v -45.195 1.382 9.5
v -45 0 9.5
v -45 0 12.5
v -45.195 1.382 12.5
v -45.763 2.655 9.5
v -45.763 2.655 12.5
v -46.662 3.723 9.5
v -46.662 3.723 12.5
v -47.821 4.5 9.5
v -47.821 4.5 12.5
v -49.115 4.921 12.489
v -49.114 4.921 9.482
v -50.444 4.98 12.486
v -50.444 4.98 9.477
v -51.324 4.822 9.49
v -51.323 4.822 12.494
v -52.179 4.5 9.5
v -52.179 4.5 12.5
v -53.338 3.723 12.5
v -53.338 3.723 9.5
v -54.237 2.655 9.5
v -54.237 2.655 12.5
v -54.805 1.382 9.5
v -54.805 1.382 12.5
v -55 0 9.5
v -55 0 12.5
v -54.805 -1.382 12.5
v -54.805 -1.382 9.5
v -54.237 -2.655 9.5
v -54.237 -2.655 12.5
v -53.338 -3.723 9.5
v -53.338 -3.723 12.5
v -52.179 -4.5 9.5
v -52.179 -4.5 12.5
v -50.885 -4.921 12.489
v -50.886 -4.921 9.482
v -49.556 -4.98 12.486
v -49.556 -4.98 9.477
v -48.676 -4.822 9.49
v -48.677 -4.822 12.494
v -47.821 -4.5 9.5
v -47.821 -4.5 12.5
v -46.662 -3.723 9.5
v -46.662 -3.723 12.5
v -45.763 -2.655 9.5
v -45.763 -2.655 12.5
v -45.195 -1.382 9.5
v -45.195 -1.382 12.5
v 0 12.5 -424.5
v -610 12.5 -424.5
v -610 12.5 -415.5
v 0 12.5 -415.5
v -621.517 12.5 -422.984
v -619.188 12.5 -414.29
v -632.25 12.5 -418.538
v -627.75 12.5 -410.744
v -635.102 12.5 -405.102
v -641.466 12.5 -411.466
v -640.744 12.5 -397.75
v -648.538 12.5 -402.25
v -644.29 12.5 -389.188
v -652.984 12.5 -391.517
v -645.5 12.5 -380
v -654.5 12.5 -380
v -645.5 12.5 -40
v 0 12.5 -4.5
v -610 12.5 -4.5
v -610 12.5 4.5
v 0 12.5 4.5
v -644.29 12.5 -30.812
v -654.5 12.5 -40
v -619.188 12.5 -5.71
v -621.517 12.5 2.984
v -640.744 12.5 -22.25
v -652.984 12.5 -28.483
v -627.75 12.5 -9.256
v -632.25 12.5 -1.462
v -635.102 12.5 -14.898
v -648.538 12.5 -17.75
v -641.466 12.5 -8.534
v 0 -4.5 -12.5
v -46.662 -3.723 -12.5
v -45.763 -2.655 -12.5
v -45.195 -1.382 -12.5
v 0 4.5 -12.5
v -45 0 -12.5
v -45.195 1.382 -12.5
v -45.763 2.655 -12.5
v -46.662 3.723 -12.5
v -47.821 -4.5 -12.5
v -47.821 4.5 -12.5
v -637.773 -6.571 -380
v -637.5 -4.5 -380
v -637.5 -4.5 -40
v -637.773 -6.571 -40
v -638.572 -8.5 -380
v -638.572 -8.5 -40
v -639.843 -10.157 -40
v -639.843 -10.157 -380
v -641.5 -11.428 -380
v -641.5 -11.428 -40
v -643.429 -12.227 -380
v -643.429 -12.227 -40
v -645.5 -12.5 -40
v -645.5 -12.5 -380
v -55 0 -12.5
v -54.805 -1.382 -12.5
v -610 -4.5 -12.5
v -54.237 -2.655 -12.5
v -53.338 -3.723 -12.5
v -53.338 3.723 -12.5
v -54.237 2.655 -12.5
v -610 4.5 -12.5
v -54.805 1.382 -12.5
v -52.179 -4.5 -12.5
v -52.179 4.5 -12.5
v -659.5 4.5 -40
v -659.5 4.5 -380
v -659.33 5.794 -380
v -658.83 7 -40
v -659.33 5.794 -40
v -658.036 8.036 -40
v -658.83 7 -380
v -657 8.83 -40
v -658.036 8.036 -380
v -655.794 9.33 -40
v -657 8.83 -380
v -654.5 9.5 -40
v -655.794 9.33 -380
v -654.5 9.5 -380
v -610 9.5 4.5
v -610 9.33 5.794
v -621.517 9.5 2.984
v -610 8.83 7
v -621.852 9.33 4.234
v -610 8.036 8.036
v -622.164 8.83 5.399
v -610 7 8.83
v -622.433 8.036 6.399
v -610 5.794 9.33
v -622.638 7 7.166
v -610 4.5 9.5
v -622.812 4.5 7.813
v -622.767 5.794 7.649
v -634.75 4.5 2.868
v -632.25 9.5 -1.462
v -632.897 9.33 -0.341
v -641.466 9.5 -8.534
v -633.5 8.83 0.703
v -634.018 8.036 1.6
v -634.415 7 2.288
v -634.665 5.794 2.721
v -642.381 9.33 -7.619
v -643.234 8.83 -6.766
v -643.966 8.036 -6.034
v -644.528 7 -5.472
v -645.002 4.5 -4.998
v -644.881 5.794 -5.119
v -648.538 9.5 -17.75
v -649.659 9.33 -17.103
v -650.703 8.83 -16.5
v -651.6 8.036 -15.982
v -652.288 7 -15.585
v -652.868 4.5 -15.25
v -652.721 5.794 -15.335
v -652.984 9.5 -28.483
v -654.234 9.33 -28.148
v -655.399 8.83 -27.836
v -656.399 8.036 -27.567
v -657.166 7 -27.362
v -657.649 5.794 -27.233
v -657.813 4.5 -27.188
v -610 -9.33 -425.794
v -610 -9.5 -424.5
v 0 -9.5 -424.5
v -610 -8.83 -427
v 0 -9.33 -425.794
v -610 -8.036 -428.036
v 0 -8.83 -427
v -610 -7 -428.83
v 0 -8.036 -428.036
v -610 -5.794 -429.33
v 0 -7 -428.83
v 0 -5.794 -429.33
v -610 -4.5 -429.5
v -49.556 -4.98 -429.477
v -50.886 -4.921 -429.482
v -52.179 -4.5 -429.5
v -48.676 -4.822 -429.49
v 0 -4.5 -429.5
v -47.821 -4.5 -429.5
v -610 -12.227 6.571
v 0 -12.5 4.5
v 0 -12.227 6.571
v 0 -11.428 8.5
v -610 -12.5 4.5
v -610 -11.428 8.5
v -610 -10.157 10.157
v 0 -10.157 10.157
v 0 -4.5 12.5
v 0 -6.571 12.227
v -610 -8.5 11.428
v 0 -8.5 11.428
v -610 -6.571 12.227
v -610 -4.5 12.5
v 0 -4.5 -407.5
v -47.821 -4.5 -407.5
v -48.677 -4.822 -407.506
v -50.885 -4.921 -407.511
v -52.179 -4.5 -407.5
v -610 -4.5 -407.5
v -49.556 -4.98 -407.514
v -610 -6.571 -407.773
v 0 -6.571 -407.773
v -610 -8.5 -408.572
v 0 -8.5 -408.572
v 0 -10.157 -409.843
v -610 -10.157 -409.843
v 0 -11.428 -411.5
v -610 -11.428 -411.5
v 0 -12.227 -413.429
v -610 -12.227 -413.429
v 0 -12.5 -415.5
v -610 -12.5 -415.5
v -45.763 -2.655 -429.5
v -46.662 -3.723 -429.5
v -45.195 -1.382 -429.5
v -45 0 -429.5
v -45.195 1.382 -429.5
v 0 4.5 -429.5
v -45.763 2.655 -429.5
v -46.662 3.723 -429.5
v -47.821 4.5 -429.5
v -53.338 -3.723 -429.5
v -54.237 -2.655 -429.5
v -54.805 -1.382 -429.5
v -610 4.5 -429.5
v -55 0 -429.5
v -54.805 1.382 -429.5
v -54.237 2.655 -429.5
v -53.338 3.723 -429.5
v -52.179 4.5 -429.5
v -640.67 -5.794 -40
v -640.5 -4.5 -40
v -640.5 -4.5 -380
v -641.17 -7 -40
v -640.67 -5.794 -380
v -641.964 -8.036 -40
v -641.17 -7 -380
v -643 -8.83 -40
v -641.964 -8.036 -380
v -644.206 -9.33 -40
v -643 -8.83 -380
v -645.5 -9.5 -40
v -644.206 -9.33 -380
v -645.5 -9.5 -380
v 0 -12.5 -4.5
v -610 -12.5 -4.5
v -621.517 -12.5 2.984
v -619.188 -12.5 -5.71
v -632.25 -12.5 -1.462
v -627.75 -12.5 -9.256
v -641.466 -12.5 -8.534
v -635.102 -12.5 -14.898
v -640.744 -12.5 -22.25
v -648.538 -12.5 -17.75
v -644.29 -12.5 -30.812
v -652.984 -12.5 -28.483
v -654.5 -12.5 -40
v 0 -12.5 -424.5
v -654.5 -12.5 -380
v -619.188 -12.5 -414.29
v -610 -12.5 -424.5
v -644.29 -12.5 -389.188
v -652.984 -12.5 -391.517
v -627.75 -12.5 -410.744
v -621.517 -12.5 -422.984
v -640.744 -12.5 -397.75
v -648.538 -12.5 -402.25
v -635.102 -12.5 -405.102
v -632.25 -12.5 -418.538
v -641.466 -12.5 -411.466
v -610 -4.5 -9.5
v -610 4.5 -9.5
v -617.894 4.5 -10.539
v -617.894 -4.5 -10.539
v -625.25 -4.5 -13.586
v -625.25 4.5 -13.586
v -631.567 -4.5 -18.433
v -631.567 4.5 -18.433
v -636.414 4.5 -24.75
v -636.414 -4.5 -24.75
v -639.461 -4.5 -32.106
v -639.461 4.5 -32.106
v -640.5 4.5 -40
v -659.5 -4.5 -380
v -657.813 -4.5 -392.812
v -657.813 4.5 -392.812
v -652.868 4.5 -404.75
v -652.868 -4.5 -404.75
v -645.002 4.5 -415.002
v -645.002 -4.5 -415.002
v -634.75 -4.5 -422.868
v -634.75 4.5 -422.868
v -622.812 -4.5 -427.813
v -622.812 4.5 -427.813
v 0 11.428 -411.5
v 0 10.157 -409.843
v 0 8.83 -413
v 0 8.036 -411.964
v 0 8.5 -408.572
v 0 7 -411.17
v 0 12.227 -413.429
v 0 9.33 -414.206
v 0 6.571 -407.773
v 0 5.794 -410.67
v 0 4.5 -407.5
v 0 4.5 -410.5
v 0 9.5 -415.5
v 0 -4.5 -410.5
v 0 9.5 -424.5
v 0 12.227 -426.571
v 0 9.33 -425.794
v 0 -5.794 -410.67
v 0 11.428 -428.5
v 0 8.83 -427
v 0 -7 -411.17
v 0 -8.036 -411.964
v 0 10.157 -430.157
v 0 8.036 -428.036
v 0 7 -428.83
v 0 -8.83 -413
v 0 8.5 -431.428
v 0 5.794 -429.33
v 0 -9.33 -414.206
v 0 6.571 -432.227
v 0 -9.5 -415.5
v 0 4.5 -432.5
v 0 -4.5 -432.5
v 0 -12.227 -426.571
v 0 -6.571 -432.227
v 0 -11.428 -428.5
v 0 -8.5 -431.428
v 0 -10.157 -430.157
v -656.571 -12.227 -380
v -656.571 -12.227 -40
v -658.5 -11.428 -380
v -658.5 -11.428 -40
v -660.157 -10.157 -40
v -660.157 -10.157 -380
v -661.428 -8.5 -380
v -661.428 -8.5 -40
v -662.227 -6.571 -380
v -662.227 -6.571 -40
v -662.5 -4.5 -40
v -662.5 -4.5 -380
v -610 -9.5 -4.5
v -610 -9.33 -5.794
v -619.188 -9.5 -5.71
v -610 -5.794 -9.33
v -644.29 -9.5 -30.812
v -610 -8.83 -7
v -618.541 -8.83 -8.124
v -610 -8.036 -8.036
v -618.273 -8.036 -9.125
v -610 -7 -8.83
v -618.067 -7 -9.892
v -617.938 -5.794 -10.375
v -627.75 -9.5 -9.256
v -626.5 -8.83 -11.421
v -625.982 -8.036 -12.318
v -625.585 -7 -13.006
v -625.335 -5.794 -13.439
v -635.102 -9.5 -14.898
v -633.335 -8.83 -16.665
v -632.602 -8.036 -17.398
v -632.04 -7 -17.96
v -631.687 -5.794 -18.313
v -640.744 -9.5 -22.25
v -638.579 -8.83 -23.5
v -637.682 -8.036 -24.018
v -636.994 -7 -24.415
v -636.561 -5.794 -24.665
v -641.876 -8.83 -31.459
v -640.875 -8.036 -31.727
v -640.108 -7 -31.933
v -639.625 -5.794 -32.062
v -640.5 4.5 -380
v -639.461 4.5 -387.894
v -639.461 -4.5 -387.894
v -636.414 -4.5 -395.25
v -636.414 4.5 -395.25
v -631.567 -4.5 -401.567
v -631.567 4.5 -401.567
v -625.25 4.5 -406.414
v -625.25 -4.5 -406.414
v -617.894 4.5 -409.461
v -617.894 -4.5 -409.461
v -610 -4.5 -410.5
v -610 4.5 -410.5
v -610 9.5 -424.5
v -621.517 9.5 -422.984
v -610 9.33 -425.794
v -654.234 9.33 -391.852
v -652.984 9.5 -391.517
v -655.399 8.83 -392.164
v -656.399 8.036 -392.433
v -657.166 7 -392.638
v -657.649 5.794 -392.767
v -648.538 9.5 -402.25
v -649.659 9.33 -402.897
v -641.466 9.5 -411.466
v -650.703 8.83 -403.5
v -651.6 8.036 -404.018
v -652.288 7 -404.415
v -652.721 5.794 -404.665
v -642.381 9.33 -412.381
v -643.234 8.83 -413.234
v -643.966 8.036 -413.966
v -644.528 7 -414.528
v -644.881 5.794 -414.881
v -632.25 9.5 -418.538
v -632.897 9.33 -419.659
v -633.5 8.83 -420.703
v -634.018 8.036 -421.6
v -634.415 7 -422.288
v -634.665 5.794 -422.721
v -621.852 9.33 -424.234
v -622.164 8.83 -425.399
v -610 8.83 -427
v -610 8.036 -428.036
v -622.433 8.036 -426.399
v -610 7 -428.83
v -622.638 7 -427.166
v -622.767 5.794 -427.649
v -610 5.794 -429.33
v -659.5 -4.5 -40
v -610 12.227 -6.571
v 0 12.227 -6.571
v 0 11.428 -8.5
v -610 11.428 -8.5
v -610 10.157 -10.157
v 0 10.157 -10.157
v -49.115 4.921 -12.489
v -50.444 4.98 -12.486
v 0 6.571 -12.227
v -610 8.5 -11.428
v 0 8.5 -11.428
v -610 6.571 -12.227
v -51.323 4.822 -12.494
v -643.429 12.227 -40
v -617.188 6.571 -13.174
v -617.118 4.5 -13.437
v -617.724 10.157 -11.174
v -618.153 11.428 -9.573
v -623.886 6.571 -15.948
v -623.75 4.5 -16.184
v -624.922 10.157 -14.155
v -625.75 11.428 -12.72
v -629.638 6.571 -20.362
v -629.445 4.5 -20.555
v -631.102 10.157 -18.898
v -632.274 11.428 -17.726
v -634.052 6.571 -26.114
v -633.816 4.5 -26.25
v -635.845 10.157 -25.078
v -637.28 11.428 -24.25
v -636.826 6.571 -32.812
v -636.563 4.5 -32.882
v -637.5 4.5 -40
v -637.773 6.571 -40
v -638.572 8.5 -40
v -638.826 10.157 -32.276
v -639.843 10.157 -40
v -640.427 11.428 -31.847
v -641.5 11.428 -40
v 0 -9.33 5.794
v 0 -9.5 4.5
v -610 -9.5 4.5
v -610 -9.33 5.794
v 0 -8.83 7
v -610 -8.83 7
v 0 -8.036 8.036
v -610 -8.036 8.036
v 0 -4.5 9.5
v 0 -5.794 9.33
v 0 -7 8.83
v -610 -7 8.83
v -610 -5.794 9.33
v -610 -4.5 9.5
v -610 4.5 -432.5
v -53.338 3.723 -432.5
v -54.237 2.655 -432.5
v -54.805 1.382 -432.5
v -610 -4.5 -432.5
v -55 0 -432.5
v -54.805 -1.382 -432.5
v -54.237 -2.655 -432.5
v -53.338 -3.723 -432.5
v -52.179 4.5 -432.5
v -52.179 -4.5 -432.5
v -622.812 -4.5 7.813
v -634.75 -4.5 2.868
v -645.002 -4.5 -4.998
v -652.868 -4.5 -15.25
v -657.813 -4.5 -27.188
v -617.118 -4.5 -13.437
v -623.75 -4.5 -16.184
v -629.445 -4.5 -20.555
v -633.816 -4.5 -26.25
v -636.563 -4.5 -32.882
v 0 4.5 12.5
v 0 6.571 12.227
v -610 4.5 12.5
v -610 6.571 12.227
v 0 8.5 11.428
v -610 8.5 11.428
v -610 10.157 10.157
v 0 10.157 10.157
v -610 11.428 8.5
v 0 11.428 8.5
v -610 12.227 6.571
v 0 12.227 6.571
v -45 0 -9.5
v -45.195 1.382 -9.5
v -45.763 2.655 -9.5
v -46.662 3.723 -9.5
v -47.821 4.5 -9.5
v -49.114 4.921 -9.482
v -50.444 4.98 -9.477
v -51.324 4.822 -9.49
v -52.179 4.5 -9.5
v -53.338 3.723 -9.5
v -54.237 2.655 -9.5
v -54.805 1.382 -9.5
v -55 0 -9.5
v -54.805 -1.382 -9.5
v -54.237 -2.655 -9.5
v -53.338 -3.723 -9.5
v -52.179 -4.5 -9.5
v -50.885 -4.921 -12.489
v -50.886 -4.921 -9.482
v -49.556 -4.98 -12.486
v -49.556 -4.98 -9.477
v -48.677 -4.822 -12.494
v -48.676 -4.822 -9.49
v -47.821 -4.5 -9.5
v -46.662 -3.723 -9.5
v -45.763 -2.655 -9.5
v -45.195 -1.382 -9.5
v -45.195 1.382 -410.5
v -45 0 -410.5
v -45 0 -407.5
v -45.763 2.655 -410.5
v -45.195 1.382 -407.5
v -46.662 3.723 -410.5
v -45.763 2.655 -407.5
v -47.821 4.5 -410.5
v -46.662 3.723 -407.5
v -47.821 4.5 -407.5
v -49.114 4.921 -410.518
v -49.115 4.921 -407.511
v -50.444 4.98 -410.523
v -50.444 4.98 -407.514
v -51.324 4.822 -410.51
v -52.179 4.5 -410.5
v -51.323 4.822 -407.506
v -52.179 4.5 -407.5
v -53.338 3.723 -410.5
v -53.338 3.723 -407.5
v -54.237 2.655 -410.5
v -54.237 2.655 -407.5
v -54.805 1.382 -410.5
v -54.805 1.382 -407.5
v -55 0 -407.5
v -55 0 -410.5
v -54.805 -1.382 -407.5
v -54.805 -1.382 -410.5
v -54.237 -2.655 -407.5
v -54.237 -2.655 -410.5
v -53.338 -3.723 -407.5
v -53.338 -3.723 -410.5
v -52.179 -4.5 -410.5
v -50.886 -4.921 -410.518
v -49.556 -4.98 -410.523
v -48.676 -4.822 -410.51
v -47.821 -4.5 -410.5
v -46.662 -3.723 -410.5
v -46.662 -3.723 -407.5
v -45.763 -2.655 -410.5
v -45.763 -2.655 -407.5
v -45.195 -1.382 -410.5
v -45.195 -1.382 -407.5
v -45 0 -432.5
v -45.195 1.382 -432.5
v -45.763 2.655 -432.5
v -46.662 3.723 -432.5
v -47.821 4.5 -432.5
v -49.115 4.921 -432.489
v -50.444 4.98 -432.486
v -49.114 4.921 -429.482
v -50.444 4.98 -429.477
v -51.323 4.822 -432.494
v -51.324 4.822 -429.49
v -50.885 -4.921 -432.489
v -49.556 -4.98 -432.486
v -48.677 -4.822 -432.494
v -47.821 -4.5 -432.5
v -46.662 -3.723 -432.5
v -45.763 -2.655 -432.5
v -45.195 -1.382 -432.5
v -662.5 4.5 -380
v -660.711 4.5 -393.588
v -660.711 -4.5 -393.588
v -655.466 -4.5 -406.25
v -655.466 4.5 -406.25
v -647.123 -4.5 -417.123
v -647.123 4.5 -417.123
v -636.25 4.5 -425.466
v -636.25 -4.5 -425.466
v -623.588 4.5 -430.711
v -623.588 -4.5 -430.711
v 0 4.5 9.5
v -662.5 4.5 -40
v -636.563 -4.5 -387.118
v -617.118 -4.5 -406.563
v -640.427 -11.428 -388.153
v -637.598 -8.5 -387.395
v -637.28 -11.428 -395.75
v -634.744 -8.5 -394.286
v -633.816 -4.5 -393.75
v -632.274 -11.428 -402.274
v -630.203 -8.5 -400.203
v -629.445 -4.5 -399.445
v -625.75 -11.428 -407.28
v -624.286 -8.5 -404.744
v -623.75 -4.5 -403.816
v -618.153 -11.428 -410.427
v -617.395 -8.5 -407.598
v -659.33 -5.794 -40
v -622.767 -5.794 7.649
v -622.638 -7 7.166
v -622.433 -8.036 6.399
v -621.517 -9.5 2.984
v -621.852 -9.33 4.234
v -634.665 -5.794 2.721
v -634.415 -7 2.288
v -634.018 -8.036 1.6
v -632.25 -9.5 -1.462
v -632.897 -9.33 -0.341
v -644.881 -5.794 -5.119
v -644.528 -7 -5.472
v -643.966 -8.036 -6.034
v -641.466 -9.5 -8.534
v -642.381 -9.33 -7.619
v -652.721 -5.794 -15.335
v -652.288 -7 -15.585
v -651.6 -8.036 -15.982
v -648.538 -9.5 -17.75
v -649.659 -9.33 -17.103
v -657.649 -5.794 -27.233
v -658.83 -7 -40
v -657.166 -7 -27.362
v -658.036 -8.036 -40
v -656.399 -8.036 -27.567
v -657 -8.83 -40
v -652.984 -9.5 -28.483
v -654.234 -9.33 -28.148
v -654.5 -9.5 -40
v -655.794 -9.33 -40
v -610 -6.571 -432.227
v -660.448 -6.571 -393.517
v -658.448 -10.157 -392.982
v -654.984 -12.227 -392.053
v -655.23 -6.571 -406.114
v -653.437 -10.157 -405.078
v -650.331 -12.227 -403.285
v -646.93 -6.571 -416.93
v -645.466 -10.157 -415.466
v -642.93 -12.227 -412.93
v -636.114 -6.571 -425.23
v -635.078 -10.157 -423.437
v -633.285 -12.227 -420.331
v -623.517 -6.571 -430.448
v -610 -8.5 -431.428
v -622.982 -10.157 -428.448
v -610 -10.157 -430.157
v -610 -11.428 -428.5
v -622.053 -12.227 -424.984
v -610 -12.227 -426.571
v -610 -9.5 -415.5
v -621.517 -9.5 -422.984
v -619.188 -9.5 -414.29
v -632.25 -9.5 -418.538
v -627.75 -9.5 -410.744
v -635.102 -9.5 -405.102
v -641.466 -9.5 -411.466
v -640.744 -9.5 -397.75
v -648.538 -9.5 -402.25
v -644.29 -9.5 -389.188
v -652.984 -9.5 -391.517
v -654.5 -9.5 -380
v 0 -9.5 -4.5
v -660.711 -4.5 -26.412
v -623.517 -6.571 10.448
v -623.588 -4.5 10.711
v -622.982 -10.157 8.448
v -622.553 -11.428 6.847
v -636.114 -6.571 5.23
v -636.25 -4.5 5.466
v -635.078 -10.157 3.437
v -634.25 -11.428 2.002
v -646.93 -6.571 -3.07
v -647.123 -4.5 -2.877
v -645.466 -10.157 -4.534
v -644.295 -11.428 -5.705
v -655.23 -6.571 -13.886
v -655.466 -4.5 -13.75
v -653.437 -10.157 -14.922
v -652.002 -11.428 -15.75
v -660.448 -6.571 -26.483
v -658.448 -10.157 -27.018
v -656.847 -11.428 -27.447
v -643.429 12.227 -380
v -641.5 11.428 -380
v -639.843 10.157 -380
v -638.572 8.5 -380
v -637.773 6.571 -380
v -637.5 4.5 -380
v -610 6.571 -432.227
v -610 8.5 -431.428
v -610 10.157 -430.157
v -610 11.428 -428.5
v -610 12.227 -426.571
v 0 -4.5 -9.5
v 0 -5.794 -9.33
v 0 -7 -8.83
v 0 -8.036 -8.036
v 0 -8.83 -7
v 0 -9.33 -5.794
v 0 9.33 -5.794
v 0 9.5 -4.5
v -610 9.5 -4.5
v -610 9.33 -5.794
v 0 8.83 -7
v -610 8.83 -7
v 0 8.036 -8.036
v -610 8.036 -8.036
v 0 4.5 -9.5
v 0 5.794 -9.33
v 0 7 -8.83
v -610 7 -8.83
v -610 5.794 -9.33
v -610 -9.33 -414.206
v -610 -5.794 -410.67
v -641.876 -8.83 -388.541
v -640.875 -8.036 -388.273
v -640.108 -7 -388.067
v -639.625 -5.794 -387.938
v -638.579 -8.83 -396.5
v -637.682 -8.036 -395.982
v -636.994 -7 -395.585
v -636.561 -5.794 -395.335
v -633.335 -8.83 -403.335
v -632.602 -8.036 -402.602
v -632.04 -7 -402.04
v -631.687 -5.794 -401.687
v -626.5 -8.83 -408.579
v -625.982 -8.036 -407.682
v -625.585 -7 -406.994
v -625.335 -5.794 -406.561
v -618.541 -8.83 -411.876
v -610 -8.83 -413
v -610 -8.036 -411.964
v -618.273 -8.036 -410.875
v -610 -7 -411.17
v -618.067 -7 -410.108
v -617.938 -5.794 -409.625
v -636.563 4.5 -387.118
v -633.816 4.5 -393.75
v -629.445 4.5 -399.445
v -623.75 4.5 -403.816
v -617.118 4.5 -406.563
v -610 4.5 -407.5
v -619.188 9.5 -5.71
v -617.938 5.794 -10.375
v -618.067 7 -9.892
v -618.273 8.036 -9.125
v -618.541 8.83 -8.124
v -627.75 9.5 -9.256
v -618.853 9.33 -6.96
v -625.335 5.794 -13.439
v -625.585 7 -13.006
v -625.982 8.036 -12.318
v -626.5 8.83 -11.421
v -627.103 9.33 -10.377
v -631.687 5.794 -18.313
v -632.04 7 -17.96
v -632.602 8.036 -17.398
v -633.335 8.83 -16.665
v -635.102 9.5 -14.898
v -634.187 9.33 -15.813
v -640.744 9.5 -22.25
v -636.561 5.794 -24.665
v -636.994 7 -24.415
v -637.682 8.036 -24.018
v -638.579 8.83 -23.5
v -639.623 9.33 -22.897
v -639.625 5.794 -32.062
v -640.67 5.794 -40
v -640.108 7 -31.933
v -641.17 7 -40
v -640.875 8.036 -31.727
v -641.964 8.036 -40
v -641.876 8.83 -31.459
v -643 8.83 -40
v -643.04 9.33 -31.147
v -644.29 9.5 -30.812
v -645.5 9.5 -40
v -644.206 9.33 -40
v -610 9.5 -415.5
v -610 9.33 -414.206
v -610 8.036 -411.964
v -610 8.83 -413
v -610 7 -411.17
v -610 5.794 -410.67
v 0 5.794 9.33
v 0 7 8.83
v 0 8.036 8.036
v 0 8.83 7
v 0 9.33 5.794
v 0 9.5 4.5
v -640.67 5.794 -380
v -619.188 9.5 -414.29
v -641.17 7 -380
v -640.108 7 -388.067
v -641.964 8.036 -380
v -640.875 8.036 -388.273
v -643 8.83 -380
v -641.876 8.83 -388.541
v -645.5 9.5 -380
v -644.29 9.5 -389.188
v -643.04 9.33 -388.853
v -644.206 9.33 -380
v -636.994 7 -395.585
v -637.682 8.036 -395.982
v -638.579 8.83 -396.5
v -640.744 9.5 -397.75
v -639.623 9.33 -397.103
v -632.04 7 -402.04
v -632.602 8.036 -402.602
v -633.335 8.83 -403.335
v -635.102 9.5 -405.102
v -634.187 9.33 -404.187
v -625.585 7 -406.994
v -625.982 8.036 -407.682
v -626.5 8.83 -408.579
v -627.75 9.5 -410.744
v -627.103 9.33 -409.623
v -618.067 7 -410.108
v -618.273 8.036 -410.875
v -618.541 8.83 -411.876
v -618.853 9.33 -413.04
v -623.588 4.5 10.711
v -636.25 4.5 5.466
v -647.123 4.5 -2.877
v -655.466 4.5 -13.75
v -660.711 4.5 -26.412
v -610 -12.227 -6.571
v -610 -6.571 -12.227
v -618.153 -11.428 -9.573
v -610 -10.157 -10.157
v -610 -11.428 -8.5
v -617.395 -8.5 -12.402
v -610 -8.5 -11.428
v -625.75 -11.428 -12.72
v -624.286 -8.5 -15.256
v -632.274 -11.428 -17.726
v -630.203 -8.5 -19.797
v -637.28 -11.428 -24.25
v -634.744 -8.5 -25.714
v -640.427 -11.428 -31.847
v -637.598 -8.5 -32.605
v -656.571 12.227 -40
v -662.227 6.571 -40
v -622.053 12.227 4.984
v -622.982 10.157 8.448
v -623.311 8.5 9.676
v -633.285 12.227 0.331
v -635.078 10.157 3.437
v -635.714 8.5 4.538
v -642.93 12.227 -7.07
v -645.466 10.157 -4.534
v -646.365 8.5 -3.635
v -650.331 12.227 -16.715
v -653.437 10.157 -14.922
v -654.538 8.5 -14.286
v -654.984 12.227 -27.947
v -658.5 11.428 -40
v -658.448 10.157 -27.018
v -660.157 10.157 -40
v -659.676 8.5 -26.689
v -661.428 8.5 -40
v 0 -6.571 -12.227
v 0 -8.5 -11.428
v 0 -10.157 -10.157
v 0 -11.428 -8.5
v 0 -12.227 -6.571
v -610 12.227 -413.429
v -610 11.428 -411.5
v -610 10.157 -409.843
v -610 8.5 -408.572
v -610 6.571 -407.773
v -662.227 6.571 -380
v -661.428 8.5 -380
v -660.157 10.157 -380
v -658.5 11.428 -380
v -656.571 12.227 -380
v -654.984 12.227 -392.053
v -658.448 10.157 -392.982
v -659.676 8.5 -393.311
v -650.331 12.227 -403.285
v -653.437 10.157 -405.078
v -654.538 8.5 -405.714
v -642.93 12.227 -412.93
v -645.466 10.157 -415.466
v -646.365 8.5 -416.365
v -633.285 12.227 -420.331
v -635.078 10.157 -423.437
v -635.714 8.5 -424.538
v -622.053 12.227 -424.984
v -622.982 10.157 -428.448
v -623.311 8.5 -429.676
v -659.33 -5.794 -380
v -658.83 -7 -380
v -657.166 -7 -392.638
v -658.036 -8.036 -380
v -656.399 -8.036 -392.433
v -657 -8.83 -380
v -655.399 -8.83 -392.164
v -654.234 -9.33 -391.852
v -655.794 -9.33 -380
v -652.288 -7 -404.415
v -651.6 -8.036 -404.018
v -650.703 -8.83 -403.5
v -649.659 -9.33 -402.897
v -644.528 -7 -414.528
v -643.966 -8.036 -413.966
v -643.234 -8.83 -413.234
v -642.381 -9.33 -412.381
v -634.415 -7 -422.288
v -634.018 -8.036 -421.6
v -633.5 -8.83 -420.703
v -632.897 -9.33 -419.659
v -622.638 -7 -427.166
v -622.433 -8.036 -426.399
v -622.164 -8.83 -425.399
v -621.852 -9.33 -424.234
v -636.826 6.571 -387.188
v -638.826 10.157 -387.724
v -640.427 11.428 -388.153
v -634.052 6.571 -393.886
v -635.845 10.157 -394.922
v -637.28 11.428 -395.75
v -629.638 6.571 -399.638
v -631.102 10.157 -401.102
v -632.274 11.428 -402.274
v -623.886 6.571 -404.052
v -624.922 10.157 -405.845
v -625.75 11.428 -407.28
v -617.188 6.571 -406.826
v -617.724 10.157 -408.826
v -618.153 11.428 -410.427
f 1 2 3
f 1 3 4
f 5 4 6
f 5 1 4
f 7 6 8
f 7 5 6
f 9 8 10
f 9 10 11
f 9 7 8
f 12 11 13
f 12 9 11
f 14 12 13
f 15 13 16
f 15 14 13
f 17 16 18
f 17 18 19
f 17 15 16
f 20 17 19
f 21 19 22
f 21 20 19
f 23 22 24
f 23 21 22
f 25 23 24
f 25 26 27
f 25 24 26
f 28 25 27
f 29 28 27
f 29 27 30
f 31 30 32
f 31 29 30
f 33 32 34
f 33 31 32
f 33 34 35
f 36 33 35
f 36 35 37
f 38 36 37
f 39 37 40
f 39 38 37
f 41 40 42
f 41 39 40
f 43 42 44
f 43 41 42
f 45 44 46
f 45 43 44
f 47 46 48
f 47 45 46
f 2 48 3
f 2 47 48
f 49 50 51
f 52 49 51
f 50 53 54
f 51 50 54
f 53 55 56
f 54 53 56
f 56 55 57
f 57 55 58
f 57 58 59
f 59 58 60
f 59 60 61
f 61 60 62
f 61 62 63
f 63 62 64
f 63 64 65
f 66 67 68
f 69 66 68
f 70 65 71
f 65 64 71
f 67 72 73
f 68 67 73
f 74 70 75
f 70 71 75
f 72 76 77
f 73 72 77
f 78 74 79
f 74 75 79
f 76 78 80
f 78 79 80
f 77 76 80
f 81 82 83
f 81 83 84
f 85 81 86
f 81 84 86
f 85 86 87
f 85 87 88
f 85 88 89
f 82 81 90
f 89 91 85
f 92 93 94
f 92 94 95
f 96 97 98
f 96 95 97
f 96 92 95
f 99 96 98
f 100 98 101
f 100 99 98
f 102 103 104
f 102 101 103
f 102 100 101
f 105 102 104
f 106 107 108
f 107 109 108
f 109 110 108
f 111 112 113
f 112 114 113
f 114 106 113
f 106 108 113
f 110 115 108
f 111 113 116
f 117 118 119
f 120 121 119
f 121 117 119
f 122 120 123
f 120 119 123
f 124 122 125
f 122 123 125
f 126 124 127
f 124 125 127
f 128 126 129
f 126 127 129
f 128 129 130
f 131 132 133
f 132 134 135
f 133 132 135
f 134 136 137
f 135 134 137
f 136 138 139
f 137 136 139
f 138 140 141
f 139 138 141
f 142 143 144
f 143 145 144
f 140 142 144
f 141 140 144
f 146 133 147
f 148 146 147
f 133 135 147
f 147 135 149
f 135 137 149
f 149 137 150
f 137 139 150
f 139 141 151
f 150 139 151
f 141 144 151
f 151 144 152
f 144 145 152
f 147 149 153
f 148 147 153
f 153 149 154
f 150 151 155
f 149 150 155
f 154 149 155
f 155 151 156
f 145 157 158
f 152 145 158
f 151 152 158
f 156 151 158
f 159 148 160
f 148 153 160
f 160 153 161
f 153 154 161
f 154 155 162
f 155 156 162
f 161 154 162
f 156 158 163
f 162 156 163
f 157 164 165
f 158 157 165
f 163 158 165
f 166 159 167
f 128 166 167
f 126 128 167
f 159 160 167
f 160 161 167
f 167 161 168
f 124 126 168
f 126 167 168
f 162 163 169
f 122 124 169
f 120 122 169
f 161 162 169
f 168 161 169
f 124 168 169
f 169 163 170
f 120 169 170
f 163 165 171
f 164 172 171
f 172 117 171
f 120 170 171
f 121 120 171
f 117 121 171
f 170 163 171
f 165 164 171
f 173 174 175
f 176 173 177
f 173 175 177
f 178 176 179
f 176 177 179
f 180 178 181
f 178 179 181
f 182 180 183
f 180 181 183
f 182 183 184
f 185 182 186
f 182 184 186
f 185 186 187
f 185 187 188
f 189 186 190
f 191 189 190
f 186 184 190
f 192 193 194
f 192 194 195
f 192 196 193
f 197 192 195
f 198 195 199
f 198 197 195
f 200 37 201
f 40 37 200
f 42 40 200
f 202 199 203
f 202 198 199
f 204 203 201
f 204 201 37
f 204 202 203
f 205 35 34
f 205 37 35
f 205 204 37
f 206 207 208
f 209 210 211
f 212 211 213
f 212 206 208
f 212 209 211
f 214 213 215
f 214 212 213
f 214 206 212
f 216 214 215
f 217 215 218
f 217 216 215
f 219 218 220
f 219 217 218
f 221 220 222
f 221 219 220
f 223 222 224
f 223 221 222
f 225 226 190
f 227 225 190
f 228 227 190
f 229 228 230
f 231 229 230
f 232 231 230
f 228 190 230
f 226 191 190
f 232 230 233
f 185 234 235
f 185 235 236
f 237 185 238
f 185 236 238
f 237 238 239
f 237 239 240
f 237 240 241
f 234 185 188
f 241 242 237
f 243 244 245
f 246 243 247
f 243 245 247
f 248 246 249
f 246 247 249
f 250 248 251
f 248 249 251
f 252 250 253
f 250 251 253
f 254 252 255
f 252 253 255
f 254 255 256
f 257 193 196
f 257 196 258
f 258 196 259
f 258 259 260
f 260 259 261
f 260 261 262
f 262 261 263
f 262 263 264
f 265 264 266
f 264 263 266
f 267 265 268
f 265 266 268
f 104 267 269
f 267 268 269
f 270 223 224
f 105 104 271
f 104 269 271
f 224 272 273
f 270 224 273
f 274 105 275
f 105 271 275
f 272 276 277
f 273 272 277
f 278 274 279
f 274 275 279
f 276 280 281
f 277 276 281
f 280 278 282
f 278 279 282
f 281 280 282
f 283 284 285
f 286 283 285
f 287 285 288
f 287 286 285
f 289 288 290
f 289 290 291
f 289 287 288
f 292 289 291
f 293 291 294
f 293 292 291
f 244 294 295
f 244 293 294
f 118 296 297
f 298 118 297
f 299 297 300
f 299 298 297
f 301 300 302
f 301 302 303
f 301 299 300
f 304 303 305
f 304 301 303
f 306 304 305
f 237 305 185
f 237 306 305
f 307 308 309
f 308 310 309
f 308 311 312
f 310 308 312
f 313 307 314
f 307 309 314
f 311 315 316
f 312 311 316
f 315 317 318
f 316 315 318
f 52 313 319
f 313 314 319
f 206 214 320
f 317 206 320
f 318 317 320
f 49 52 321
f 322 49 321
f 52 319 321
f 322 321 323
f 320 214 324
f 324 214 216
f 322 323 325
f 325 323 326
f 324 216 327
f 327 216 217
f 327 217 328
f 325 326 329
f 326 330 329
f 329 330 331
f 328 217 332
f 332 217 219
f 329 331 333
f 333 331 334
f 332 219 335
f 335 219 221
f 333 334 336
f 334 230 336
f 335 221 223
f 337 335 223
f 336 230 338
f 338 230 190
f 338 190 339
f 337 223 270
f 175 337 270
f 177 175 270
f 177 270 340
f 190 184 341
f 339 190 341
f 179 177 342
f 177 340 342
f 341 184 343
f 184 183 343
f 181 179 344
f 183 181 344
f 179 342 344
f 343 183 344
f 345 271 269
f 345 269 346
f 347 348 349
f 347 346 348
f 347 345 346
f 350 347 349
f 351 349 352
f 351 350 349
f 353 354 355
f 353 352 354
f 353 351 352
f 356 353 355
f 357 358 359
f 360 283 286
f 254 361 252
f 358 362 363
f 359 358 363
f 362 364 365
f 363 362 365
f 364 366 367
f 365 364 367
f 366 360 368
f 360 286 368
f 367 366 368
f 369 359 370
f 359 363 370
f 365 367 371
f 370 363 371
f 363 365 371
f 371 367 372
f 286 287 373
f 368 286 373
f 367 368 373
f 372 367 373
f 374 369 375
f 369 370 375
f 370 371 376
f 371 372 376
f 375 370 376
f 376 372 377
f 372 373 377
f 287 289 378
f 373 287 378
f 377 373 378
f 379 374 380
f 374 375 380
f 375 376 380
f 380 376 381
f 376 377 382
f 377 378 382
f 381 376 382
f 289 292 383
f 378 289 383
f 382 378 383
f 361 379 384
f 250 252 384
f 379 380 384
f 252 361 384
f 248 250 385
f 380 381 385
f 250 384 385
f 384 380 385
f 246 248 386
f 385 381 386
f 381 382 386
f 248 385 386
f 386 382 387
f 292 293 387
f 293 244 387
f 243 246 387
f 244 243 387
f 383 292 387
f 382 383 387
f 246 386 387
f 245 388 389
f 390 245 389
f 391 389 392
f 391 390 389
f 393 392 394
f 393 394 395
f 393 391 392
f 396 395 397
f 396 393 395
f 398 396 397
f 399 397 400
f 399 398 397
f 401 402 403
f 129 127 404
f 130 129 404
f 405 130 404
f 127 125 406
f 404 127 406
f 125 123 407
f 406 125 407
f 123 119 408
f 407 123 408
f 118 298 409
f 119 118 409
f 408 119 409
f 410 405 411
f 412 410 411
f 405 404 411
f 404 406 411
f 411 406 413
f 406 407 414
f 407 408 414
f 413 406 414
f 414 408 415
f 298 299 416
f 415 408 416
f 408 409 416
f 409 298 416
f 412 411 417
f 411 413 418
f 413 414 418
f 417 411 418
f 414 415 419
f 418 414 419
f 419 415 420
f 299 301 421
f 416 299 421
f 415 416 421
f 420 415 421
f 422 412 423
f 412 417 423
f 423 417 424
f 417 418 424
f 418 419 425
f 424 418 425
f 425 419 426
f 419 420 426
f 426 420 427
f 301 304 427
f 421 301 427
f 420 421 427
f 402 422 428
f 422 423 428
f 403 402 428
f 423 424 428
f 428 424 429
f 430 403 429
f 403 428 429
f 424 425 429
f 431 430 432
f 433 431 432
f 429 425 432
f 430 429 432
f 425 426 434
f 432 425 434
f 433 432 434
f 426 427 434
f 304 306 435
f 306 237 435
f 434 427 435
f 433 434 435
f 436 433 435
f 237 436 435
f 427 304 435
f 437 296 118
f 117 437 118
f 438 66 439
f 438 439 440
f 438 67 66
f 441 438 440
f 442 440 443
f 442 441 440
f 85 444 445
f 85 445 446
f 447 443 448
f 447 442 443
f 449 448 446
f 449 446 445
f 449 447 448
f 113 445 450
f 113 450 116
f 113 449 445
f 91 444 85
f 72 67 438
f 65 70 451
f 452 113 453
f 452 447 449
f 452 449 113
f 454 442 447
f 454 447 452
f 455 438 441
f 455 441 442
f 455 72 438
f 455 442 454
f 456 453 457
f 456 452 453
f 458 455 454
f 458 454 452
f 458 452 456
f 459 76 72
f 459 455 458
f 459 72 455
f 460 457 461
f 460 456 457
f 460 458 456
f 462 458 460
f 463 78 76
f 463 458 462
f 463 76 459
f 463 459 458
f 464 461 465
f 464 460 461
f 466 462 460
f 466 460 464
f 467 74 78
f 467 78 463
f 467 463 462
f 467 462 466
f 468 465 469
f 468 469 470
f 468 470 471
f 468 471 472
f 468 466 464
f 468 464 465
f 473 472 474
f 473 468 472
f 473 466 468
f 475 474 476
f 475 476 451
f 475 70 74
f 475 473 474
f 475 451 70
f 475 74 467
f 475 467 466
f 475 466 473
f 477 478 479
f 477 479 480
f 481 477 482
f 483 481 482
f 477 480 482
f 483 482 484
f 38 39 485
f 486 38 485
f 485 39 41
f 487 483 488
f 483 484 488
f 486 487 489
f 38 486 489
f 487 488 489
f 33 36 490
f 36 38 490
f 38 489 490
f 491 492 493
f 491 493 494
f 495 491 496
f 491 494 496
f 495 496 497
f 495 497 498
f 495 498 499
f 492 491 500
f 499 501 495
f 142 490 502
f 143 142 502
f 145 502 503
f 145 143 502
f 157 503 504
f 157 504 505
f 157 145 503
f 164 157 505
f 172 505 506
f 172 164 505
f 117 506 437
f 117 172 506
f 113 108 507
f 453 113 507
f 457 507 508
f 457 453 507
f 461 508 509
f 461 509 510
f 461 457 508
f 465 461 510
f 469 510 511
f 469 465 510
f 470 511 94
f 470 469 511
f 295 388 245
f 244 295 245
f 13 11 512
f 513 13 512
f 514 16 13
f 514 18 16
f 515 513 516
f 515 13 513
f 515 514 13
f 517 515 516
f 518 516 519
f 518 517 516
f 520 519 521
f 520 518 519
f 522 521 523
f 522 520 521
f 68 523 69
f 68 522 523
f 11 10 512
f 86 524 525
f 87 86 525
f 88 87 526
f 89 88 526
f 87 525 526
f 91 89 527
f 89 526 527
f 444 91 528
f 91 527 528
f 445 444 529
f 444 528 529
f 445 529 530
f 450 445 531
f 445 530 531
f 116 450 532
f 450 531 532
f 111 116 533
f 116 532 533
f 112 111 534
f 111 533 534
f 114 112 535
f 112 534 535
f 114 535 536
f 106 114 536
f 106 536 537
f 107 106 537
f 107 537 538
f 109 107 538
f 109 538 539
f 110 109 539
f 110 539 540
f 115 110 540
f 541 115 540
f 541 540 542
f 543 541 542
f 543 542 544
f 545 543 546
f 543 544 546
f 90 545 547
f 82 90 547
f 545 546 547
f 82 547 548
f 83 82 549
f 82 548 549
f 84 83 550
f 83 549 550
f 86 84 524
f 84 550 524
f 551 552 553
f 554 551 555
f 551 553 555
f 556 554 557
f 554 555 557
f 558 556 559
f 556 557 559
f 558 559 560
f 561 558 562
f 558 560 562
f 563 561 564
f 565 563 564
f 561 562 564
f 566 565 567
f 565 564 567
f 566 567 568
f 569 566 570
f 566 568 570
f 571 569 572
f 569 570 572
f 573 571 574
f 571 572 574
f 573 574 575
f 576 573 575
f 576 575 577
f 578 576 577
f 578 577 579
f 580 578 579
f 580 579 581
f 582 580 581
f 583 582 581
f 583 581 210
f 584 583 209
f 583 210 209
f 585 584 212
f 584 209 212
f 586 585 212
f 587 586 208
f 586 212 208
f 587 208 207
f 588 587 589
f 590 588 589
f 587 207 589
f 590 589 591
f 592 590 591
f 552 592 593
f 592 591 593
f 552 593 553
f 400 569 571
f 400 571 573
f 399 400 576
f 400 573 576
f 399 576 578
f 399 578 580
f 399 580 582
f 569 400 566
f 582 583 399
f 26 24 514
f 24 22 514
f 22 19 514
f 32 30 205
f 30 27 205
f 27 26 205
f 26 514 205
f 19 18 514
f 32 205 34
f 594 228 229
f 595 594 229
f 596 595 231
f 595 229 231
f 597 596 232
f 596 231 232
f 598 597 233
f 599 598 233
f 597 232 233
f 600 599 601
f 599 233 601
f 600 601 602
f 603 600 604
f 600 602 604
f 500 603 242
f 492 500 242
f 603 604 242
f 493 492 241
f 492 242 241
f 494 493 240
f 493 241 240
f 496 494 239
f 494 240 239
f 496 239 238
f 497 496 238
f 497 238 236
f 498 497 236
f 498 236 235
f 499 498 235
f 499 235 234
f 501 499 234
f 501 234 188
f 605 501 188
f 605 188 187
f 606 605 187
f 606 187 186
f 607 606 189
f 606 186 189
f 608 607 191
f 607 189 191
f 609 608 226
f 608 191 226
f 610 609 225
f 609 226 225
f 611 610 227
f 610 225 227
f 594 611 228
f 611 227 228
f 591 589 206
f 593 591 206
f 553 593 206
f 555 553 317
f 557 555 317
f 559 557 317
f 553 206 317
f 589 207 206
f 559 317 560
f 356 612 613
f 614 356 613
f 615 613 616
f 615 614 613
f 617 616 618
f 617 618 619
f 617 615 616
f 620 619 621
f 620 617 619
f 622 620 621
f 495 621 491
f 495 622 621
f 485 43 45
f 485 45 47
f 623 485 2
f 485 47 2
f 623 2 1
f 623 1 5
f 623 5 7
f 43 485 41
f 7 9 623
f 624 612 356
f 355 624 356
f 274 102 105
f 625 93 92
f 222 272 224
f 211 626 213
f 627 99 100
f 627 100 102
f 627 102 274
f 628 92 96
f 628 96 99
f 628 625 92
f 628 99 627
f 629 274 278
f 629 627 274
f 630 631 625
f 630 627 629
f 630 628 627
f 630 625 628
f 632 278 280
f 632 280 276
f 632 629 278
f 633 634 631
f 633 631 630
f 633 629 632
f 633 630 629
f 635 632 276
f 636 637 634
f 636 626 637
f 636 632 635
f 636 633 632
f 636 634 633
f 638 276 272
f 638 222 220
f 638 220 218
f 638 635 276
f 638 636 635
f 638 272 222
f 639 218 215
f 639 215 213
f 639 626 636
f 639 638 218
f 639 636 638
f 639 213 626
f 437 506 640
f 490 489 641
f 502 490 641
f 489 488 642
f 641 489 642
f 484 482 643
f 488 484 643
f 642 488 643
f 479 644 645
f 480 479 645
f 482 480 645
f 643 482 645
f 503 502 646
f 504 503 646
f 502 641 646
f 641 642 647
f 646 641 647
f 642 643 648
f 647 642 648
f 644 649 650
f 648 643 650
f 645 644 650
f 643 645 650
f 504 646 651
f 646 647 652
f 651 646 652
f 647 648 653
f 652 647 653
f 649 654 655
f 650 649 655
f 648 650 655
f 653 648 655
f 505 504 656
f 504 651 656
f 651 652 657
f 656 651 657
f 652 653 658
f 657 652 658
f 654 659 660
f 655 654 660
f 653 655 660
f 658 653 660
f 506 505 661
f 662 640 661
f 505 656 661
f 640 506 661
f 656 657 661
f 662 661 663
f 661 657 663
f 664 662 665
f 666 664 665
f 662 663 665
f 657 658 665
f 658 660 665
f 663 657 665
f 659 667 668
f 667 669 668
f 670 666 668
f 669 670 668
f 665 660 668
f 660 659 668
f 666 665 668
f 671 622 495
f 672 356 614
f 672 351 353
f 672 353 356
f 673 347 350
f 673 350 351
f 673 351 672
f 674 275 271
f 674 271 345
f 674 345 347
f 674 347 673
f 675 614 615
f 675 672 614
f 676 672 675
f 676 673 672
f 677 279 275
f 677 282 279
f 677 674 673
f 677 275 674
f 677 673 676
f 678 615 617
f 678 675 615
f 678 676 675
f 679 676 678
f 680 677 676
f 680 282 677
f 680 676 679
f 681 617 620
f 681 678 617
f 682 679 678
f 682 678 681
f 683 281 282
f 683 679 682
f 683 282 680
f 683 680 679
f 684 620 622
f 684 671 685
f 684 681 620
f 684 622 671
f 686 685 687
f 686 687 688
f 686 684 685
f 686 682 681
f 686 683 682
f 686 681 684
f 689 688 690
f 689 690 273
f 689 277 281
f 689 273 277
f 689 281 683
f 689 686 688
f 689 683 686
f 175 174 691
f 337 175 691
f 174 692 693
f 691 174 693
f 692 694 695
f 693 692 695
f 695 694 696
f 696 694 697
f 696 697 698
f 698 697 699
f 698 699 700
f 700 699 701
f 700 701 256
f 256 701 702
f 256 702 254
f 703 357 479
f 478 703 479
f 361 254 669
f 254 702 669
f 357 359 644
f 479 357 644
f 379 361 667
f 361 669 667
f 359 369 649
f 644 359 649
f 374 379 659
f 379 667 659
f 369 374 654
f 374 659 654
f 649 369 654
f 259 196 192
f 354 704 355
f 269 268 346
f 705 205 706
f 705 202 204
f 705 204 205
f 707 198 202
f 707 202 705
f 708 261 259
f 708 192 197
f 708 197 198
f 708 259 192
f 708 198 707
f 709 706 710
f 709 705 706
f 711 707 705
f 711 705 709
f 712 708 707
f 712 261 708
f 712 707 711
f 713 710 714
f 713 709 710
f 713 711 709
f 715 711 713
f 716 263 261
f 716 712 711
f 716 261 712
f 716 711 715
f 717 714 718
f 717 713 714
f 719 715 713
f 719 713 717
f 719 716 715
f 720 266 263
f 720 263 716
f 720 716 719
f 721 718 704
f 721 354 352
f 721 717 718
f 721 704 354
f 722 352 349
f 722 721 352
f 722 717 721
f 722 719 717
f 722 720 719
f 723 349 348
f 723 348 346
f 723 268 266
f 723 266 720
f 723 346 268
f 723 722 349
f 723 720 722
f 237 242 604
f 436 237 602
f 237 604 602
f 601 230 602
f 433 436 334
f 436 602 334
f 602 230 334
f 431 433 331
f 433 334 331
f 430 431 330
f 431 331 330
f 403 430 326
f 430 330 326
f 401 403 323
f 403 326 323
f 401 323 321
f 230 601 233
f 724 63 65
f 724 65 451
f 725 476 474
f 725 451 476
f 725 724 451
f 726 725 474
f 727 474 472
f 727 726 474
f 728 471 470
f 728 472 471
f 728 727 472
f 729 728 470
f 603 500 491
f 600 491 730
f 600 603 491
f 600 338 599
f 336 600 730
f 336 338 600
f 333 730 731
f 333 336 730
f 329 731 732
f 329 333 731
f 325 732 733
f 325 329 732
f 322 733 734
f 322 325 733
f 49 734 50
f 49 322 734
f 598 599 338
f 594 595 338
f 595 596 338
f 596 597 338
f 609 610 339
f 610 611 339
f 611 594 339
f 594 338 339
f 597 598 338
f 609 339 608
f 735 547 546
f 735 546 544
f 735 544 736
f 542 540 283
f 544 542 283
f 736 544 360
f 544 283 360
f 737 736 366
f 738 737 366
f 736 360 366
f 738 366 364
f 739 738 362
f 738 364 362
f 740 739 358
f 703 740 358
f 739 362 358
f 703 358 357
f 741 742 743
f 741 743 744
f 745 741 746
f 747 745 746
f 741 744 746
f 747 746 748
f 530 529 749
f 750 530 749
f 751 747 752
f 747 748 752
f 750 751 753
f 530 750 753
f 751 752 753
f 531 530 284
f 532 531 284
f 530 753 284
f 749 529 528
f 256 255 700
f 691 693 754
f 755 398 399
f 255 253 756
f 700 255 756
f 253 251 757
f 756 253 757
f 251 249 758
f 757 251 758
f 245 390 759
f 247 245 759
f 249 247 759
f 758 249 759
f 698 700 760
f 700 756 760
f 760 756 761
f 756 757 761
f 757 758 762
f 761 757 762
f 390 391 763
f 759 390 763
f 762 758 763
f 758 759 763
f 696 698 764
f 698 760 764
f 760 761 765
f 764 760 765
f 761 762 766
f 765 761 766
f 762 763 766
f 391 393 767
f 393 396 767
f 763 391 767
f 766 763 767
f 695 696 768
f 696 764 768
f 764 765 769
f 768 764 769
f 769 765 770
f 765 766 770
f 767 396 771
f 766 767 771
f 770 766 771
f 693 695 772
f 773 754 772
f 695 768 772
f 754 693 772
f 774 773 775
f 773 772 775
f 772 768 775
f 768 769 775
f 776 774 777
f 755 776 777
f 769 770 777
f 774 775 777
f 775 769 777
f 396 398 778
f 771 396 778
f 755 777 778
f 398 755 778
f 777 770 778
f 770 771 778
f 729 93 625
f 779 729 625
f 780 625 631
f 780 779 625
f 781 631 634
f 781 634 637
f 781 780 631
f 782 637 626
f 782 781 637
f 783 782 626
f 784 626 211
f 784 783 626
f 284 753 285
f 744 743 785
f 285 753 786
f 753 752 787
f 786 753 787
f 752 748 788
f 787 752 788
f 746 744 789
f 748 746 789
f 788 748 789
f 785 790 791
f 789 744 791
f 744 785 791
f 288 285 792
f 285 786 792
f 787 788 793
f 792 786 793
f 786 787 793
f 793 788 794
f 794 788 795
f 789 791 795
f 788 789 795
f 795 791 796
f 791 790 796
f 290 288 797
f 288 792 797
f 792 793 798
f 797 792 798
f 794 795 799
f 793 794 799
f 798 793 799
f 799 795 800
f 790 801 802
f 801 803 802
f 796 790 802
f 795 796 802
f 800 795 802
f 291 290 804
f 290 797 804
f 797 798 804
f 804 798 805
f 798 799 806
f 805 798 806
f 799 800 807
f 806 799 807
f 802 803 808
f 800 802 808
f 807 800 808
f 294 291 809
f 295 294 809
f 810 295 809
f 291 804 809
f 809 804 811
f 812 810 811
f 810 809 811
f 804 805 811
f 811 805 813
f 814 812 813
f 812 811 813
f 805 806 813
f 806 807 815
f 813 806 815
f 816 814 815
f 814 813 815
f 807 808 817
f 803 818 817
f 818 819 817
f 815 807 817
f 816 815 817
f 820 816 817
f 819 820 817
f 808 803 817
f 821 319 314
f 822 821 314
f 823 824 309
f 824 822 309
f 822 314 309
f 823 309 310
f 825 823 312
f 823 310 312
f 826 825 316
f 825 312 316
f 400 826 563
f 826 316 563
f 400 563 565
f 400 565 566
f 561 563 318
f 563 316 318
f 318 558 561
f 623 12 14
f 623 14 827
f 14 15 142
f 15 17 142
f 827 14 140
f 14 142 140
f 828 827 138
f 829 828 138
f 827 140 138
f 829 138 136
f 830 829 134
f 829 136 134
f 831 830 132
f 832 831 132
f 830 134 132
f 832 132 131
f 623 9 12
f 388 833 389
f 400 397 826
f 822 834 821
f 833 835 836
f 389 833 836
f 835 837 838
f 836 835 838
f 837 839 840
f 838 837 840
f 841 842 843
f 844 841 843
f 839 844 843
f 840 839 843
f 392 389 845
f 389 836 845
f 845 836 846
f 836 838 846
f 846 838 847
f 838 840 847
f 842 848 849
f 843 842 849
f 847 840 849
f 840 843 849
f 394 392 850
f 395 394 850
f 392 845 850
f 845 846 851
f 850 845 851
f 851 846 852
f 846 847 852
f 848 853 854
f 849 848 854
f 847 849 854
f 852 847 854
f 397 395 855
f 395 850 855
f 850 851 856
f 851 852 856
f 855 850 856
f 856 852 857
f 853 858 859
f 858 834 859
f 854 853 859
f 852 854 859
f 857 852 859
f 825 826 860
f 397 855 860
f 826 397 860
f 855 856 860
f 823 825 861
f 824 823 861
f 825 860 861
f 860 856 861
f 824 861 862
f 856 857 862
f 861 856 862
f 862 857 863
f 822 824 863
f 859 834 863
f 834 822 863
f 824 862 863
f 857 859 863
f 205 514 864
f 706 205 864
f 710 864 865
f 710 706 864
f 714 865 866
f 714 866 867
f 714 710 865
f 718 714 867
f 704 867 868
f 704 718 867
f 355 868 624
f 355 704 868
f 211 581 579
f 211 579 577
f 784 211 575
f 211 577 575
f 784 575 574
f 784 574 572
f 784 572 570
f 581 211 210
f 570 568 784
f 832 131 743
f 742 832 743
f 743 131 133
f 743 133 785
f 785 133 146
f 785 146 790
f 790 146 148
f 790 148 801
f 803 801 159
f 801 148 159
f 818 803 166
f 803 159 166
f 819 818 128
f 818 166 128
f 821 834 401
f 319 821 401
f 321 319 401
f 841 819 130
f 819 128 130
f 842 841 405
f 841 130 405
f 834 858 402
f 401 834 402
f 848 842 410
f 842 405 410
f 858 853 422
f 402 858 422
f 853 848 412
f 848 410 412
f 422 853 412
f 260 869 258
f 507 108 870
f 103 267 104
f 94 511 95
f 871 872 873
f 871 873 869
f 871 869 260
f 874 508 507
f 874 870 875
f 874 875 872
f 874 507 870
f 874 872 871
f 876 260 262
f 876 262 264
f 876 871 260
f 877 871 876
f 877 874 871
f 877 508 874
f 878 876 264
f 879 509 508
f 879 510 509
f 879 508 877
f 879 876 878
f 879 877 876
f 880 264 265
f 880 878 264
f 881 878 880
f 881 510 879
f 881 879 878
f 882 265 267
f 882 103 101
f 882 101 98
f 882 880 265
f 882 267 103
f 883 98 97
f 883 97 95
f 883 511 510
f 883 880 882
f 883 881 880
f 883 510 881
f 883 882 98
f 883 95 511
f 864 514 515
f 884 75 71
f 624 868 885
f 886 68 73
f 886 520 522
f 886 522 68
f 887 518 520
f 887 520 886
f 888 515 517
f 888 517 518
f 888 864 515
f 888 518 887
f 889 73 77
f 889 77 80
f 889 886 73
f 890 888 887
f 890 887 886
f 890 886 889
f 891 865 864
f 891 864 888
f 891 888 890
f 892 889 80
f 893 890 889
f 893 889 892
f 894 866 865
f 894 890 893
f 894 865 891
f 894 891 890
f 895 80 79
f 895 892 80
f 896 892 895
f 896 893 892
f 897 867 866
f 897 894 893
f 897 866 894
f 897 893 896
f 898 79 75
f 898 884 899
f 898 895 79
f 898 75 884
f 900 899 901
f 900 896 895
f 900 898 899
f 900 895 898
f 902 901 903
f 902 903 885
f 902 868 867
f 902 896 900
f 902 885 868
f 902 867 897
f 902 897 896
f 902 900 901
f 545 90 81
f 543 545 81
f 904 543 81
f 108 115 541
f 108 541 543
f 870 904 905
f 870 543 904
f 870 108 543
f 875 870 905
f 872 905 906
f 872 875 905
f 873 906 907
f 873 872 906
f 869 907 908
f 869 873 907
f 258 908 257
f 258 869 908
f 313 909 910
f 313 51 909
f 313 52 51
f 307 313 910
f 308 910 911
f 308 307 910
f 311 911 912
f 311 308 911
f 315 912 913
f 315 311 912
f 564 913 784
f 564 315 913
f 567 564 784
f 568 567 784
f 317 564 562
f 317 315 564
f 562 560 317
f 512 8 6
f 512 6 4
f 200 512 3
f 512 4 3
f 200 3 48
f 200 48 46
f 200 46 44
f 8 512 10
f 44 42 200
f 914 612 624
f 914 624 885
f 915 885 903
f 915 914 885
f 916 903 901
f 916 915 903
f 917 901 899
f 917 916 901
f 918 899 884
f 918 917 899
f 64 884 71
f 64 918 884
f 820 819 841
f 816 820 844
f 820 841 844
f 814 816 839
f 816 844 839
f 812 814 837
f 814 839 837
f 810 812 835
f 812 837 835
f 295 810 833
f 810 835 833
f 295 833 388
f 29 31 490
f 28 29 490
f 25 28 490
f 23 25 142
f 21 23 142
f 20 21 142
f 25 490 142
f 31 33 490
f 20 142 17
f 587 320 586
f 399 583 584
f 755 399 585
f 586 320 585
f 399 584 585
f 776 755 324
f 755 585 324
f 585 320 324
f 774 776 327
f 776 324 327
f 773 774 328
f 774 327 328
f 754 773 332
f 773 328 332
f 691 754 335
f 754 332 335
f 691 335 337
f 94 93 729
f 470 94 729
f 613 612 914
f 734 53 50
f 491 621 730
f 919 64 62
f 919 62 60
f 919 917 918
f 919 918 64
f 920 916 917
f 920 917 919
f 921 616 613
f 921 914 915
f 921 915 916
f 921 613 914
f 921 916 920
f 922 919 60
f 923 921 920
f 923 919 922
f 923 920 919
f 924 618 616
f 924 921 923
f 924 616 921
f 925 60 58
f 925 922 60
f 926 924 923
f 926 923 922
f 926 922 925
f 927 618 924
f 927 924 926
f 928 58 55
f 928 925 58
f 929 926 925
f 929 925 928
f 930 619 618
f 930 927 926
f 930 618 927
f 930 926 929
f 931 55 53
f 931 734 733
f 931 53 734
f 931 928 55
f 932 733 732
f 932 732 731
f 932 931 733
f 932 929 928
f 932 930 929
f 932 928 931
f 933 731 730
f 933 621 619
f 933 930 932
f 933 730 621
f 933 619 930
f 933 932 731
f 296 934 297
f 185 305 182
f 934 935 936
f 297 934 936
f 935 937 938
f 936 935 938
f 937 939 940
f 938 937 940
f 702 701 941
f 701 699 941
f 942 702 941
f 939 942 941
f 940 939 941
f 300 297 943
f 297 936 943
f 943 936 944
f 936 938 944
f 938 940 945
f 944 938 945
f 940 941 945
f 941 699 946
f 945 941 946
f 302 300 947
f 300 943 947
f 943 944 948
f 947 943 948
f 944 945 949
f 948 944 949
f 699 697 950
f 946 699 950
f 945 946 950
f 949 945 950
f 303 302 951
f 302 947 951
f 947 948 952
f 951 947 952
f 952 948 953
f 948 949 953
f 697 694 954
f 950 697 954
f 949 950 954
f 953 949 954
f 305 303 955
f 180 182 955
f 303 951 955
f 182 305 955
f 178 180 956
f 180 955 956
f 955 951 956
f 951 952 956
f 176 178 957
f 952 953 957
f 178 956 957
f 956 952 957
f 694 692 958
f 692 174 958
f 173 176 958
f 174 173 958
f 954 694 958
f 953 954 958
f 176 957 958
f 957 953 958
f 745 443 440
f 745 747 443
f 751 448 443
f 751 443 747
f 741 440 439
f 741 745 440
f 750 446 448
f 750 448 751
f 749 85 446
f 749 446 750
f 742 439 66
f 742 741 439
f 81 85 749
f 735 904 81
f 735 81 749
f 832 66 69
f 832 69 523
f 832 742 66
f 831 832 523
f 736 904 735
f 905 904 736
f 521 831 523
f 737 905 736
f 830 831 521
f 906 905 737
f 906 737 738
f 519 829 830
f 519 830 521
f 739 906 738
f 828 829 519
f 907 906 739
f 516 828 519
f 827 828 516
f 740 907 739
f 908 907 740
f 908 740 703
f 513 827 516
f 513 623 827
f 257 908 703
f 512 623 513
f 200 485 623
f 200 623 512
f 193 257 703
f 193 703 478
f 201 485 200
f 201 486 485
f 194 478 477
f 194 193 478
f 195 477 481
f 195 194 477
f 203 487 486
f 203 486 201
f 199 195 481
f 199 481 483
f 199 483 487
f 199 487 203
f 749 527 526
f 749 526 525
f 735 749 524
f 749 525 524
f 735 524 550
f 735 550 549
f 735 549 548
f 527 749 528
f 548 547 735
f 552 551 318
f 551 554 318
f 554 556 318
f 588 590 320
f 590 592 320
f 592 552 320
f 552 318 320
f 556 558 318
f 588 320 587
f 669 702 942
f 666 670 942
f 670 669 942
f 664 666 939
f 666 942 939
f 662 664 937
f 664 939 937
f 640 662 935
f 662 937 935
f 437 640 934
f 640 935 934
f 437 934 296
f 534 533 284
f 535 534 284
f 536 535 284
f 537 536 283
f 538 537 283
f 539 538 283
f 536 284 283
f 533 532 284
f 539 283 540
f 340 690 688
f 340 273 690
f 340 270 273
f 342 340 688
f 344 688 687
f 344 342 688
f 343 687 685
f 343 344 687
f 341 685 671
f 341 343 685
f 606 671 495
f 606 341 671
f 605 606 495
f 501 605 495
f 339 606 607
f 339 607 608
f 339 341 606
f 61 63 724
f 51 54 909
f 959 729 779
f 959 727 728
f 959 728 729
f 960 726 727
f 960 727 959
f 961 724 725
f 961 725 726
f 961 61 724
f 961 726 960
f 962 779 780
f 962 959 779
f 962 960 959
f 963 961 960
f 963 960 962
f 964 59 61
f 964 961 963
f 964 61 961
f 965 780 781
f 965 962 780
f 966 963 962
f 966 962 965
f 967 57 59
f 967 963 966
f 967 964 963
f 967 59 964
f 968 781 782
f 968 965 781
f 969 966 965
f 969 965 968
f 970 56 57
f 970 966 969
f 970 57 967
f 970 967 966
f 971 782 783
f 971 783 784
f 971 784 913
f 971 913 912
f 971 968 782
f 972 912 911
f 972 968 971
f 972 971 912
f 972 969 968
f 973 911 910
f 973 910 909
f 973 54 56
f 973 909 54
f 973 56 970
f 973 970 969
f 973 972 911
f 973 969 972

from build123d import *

# Parameters (mm, degrees)
SKETCH3_R               = 5
CUT_EXTRUDE1_DEPTH      = 13.5000001
CUT_EXTRUDE1_DEPTH_BACK = 433.5000001


with BuildPart() as part:
    # Sweep-Thin1: sweep along a path in Sketch1
    with BuildLine(Plane(origin=(0, 0, 0), x_dir=(1, 0, 0), z_dir=(0, 1, 0))) as sweep_thin1_path:
        Line((0, 0), (-610, 0))
        ThreePointArc((-610, 0), (-638.284271247, 11.715728753), (-650, 40))
        Line((-650, 40), (-650, 380))
        ThreePointArc((-650, 380), (-638.284271247, 408.284271247), (-610, 420))
        Line((-610, 420), (0, 420))
    # Sketch2 → Sweep-Thin1 (sweep)
    with BuildSketch(Plane(origin=(0, 0, 0), x_dir=(0, 0, -1), z_dir=(1, 0, 0))):
        with BuildLine():
            Line((4.5, 12.5), (-4.5, 12.5))
            ThreePointArc((-4.5, 12.5), (-10.156854249, 10.156854249), (-12.5, 4.5))
            Line((-12.5, 4.5), (-12.5, -4.5))
            ThreePointArc((-12.5, -4.5), (-10.156854249, -10.156854249), (-4.5, -12.5))
            Line((-4.5, -12.5), (4.5, -12.5))
            ThreePointArc((4.5, -12.5), (10.156854249, -10.156854249), (12.5, -4.5))
            Line((12.5, -4.5), (12.5, 4.5))
            ThreePointArc((12.5, 4.5), (10.156854249, 10.156854249), (4.5, 12.5))
        make_face()
        with BuildLine():
            Line((4.5, 9.5), (-4.5, 9.5))
            ThreePointArc((-4.5, 9.5), (-8.035533906, 8.035533906), (-9.5, 4.5))
            Line((-9.5, 4.5), (-9.5, -4.5))
            ThreePointArc((-9.5, -4.5), (-8.035533906, -8.035533906), (-4.5, -9.5))
            Line((-4.5, -9.5), (4.5, -9.5))
            ThreePointArc((4.5, -9.5), (8.035533906, -8.035533906), (9.5, -4.5))
            Line((9.5, -4.5), (9.5, 4.5))
            ThreePointArc((9.5, 4.5), (8.035533906, 8.035533906), (4.5, 9.5))
        make_face(mode=Mode.SUBTRACT)
    sweep(path=sweep_thin1_path.line)

    # Sketch3 → Cut-Extrude1 (cut, two sides)
    with BuildSketch(Plane.XY) as cut_extrude1_sk:
        with Locations((-50, 0)):
            Circle(SKETCH3_R)
    extrude(amount=CUT_EXTRUDE1_DEPTH, mode=Mode.SUBTRACT)
    extrude(cut_extrude1_sk.sketch, amount=-CUT_EXTRUDE1_DEPTH_BACK, mode=Mode.SUBTRACT)


solid = part.part
